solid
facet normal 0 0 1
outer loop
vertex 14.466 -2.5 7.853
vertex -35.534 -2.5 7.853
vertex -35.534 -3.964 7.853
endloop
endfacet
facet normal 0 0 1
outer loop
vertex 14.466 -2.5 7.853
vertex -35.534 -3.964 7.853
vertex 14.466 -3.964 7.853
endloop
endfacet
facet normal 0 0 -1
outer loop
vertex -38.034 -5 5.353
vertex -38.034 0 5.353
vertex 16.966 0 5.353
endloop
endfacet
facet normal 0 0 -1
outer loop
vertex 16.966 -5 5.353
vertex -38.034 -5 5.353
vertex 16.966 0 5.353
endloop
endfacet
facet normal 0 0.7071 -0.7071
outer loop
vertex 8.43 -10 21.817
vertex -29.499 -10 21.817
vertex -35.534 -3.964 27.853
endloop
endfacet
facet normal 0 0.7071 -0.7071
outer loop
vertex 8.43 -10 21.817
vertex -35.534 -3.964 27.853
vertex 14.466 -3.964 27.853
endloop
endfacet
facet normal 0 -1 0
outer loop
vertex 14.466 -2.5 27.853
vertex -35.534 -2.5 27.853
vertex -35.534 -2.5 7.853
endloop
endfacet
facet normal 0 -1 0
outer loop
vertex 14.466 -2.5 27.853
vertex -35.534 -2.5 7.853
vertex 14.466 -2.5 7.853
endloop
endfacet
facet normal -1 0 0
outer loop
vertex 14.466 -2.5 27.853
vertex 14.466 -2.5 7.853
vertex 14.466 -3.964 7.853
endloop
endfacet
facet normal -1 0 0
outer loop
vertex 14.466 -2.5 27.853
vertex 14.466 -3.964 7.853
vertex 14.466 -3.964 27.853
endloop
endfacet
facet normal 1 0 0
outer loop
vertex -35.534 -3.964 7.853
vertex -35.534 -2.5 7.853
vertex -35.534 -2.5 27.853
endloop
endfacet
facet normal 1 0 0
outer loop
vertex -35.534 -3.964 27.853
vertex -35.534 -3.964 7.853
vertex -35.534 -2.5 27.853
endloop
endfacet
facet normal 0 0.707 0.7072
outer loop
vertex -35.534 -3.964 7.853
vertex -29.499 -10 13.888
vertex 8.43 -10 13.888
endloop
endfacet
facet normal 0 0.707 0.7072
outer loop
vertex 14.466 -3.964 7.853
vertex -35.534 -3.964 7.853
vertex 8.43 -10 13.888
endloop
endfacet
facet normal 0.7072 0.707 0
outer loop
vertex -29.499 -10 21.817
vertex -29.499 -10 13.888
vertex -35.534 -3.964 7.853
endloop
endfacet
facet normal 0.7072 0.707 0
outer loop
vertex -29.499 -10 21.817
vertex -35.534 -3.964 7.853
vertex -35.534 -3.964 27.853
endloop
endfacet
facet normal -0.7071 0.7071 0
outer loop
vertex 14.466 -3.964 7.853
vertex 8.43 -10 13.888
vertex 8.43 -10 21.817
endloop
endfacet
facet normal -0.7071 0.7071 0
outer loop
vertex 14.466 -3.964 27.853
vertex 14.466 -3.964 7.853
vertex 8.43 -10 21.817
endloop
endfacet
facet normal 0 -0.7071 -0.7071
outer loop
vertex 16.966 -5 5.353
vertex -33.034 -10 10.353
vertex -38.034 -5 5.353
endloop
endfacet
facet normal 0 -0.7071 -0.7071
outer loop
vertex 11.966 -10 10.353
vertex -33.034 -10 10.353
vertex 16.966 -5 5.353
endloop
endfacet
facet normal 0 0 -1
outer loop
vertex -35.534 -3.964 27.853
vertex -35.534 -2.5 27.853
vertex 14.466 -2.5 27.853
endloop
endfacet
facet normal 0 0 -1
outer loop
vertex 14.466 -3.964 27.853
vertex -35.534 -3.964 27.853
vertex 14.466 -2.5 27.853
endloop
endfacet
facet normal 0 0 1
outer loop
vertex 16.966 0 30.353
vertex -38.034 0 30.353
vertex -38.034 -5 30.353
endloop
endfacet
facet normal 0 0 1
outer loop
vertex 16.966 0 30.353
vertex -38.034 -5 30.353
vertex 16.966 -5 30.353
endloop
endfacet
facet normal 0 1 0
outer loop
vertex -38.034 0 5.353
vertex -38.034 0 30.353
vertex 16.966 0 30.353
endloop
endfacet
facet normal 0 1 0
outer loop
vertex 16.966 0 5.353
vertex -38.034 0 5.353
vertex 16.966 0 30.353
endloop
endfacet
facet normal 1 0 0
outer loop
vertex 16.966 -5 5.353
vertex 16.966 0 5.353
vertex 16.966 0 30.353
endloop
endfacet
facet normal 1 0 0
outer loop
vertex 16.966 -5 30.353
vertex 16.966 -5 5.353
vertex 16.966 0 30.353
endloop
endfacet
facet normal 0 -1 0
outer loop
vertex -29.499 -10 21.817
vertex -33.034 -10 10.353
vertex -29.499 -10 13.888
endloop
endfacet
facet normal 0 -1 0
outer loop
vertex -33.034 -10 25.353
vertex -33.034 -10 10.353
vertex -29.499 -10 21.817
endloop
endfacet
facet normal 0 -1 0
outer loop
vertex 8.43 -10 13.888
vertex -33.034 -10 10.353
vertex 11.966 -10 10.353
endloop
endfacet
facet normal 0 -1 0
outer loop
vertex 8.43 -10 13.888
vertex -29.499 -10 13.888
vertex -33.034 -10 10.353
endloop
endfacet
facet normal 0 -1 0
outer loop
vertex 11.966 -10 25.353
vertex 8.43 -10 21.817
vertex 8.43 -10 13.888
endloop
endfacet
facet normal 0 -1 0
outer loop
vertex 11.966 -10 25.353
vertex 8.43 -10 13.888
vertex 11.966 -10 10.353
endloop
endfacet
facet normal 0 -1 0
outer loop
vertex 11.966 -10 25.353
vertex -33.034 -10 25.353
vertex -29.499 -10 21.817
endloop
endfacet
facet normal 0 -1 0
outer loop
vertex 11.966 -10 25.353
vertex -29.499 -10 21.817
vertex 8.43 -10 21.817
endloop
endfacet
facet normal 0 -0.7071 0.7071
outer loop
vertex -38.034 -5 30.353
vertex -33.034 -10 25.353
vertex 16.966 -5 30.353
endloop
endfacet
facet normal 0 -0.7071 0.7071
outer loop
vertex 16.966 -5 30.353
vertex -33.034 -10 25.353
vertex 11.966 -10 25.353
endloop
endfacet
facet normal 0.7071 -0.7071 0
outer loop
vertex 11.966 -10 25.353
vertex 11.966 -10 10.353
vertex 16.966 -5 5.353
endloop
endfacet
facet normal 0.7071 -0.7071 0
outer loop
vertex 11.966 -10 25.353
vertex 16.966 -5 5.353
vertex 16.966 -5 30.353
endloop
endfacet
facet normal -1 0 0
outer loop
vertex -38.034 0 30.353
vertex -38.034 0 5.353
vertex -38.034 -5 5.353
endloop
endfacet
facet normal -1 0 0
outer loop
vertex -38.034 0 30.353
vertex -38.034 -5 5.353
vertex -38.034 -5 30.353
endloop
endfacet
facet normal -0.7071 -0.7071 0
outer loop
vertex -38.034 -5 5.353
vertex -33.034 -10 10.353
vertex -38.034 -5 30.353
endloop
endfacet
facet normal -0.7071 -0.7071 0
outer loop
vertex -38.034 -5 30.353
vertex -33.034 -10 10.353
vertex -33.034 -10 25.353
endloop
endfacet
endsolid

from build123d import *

# Parameters (mm, degrees)
F0_W     = 55
F0_H     = 25
F1_DEPTH = 10
F2_SIZE  = 5
F3_T     = -2.5


with BuildPart() as f1:
    # F0 (on Front) → F1 (new body)
    with BuildSketch(Plane.XZ):
        with Locations((-10.534275, 17.852823)):
            Rectangle(F0_W, F0_H)
    extrude(amount=F1_DEPTH)

    # F2
    f2_edges = [f1.edges().sort_by_distance(p)[0] for p in [
        (-10.534275, -10, 30.352823),
        (-38.034275, -10, 17.852823),
        (-10.534275, -10, 5.352823),
        (16.965725, -10, 17.852823),
    ]]
    chamfer(f2_edges, length=F2_SIZE)

    # F3
    f3_openings = [f1.faces().sort_by_distance(p)[0] for p in [
        (-10.534275, -10, 17.852823),
    ]]
    offset(amount=F3_T, openings=f3_openings)


solid = f1.part
